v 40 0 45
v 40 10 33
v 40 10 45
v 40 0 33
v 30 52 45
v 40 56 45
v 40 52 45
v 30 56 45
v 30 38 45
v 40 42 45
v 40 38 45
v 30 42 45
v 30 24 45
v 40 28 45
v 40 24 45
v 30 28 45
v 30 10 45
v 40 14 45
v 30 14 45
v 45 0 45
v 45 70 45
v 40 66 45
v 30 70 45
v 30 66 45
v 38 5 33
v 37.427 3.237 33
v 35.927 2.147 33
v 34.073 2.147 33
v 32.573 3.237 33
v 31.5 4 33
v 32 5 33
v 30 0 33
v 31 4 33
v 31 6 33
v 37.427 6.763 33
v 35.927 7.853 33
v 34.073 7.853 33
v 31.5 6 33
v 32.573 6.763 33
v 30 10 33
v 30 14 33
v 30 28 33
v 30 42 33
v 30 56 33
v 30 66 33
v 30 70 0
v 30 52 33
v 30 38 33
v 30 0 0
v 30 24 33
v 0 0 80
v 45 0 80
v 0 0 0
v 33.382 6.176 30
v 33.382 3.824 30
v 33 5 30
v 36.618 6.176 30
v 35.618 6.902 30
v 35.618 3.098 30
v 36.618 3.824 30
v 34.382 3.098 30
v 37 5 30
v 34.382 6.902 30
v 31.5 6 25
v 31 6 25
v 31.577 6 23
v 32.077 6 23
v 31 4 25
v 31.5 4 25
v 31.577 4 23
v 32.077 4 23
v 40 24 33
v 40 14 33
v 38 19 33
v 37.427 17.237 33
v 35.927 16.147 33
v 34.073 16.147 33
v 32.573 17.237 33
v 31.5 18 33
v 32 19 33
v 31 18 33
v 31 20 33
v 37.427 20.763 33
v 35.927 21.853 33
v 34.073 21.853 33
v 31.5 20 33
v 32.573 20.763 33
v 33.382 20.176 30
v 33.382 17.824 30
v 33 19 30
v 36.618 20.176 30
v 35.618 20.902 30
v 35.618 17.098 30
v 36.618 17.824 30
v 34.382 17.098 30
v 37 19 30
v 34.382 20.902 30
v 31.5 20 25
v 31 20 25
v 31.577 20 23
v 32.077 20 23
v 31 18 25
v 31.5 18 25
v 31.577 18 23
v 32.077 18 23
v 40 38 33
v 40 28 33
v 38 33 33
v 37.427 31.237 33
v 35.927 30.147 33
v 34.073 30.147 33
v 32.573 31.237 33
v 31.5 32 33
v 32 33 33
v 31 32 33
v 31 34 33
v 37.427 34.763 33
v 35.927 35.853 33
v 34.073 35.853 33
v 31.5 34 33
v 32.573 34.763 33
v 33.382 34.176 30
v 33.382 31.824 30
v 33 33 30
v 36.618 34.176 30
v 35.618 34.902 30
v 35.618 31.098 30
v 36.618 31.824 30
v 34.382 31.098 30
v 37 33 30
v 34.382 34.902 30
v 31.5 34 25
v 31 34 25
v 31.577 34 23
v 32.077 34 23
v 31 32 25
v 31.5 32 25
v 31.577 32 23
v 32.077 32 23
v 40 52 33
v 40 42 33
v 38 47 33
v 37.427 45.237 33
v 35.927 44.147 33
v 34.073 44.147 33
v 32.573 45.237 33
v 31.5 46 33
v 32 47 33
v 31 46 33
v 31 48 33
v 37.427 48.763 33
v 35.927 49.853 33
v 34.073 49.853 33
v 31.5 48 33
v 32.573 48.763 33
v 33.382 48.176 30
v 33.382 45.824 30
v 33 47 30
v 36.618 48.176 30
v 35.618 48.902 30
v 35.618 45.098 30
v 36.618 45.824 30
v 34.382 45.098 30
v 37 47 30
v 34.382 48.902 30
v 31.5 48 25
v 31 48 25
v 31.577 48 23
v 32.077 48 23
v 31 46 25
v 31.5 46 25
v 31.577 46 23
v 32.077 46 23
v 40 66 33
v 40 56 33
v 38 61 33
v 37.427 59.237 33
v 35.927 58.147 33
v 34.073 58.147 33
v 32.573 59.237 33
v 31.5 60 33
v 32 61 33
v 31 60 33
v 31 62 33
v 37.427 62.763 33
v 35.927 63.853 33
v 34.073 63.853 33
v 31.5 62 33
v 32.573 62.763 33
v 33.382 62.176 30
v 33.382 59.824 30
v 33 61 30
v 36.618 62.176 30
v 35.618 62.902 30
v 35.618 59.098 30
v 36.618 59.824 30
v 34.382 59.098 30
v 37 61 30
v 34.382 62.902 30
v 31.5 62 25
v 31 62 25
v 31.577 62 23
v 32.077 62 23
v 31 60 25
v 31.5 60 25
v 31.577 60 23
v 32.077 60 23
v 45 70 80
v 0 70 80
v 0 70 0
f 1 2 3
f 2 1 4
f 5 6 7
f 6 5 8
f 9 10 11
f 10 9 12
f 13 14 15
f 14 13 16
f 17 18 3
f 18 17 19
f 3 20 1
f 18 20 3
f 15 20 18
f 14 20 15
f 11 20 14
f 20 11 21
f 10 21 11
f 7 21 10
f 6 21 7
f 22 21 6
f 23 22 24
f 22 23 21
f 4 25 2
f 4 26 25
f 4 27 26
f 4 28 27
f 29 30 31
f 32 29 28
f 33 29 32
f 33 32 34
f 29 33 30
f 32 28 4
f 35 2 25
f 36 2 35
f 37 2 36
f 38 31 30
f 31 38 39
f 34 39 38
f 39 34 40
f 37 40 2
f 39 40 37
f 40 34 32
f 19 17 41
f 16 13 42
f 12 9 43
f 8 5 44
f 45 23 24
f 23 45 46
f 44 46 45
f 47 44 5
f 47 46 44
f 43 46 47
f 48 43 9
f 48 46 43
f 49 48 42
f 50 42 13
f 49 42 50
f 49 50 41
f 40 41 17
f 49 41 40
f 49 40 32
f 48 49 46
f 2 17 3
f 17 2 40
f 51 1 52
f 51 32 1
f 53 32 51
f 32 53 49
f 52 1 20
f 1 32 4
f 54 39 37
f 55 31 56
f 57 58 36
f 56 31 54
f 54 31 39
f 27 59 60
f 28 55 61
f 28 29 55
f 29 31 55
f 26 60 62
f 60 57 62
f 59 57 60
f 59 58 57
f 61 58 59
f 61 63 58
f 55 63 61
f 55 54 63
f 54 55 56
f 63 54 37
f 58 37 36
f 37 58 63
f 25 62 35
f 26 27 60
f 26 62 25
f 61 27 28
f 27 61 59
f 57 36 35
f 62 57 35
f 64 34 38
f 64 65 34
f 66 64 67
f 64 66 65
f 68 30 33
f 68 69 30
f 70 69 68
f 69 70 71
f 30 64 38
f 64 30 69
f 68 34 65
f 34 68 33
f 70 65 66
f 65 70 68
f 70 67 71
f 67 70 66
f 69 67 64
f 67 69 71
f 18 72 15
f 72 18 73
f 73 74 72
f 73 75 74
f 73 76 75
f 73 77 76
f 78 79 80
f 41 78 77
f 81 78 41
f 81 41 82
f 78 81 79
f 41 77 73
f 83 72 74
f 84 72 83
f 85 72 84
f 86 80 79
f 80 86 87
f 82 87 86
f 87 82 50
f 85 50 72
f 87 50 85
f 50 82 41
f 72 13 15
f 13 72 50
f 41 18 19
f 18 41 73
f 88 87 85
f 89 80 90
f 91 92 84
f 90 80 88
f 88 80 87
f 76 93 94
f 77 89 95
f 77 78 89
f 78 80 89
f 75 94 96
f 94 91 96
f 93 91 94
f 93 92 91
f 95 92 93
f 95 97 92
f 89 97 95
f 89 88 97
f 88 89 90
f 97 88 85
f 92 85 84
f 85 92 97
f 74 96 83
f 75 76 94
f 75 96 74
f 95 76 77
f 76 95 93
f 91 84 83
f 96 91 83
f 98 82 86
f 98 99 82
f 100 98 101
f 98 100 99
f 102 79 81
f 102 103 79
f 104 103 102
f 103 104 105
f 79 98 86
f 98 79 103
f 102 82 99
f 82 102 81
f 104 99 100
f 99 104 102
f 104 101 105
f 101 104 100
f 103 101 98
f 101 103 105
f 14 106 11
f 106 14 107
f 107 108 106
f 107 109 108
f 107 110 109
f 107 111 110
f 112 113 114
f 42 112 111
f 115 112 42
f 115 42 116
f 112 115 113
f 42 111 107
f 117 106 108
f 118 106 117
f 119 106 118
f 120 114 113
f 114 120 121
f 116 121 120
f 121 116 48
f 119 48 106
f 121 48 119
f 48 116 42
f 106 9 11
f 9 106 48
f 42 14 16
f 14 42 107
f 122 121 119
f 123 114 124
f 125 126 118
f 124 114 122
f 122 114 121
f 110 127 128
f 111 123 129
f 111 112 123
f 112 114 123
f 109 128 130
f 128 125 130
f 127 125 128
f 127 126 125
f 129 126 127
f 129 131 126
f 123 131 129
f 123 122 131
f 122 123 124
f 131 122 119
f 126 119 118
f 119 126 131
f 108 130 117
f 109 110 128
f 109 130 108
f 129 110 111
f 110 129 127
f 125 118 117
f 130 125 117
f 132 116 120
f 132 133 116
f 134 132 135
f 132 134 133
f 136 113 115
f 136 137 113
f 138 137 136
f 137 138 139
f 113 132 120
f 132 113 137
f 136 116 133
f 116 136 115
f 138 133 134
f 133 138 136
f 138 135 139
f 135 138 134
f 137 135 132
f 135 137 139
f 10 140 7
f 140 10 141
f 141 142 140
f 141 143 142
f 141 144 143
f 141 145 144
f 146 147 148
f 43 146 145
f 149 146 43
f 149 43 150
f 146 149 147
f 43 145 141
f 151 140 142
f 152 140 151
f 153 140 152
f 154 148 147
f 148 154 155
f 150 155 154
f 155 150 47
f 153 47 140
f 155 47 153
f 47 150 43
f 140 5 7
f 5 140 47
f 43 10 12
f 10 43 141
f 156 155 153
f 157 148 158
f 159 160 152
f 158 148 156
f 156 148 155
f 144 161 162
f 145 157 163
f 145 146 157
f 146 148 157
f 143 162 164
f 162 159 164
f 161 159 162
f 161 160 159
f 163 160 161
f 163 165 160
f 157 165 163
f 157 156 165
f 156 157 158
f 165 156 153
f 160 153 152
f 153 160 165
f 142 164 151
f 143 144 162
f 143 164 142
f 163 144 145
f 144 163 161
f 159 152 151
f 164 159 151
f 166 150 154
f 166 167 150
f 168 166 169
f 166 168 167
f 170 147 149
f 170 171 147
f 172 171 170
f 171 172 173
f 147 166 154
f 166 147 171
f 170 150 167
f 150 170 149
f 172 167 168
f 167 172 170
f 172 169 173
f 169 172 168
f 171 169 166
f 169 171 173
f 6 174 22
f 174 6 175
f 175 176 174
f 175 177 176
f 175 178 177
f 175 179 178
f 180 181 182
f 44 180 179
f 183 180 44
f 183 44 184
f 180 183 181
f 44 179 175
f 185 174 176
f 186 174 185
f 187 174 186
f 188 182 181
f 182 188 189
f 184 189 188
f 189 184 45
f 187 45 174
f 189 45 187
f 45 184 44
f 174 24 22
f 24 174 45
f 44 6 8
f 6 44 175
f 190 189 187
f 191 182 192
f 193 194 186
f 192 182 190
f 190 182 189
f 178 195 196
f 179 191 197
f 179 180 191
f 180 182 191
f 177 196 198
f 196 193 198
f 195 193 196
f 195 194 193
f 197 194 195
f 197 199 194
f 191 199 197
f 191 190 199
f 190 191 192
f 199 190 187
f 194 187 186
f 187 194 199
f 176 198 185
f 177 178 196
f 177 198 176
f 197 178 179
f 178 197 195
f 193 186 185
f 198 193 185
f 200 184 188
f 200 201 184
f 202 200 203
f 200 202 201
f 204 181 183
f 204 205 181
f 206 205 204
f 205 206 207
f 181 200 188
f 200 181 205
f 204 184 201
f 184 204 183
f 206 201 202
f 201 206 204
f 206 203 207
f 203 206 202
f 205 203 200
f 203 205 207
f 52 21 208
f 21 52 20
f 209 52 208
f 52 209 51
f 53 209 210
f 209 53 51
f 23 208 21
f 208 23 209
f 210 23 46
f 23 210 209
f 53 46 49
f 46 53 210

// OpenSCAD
dispenser_width = 10;
dispenser_height = 12;
dispenser_depth = 10;

nozzle_height = 3;
nozzle_top_rad = 3;
nozzle_bottom_rad_offset = 1;

dispenser_arm_length = 10;
dispenser_arm_width = 2;
dispenser_arm_thickness = 0.5;

machine_width = 70;

machine_top_height = 35;
machine_top_depth = 45;

machine_body_height = 45;
machine_body_depth = 30;

module dispenser_box() {
    cube([dispenser_depth, dispenser_width, dispenser_height]);
}

module dispenser_nozzle() {
    nozzle_bottom_rad = nozzle_top_rad - nozzle_bottom_rad_offset;

    rotate_extrude()
    polygon([
        [0, 0],
        [nozzle_bottom_rad, 0],
        [nozzle_top_rad, nozzle_height],
        [0, nozzle_height]
    ]);
}

module dispenser_arm() {
    flick_len = dispenser_arm_length * 0.2;
    flick_angle = 30;
    flick_offset = tan(flick_angle);

    arm_top =  dispenser_arm_length - flick_len;

    translate([-dispenser_arm_thickness*0/2, dispenser_arm_width/2, -arm_top])
    rotate([90, 0, 0])
    linear_extrude(dispenser_arm_width)
    polygon([
        [dispenser_arm_thickness, 0],
        [dispenser_arm_thickness, arm_top],
        [0, arm_top],
        [0, 0],
        [flick_offset, -flick_len],
        [flick_offset + dispenser_arm_thickness, -flick_len]
    ]);
}

module whole_dispenser() {
    translate([0, 0, -dispenser_height]) {
        dispenser_box();

        translate([dispenser_width/2, dispenser_depth/2, -nozzle_height])
        dispenser_nozzle();

        translate([dispenser_depth*0.1, dispenser_width/2, 0])
        dispenser_arm();
    }
}

module dispenser_array(count, sep) {
    for (i = [0: count-1]) {
        translate([0, (dispenser_width + sep) * i, 0])
        whole_dispenser();
    }
}

module machine_top() {
    cube([machine_top_depth, machine_width, machine_top_height]);
}

module machine_body() {
    cube([machine_body_depth, machine_width, machine_body_height]);
}

translate([0, 0, machine_body_height]) {
    color([1.0, 0.7, 0.7])
    machine_top();

    color([0.4, 0.4, 0.4])
    translate([machine_body_depth, 0, 0])
    dispenser_array(5, dispenser_width*0.4);

}

color([0.8, 0.8, 1.0])
machine_body();
